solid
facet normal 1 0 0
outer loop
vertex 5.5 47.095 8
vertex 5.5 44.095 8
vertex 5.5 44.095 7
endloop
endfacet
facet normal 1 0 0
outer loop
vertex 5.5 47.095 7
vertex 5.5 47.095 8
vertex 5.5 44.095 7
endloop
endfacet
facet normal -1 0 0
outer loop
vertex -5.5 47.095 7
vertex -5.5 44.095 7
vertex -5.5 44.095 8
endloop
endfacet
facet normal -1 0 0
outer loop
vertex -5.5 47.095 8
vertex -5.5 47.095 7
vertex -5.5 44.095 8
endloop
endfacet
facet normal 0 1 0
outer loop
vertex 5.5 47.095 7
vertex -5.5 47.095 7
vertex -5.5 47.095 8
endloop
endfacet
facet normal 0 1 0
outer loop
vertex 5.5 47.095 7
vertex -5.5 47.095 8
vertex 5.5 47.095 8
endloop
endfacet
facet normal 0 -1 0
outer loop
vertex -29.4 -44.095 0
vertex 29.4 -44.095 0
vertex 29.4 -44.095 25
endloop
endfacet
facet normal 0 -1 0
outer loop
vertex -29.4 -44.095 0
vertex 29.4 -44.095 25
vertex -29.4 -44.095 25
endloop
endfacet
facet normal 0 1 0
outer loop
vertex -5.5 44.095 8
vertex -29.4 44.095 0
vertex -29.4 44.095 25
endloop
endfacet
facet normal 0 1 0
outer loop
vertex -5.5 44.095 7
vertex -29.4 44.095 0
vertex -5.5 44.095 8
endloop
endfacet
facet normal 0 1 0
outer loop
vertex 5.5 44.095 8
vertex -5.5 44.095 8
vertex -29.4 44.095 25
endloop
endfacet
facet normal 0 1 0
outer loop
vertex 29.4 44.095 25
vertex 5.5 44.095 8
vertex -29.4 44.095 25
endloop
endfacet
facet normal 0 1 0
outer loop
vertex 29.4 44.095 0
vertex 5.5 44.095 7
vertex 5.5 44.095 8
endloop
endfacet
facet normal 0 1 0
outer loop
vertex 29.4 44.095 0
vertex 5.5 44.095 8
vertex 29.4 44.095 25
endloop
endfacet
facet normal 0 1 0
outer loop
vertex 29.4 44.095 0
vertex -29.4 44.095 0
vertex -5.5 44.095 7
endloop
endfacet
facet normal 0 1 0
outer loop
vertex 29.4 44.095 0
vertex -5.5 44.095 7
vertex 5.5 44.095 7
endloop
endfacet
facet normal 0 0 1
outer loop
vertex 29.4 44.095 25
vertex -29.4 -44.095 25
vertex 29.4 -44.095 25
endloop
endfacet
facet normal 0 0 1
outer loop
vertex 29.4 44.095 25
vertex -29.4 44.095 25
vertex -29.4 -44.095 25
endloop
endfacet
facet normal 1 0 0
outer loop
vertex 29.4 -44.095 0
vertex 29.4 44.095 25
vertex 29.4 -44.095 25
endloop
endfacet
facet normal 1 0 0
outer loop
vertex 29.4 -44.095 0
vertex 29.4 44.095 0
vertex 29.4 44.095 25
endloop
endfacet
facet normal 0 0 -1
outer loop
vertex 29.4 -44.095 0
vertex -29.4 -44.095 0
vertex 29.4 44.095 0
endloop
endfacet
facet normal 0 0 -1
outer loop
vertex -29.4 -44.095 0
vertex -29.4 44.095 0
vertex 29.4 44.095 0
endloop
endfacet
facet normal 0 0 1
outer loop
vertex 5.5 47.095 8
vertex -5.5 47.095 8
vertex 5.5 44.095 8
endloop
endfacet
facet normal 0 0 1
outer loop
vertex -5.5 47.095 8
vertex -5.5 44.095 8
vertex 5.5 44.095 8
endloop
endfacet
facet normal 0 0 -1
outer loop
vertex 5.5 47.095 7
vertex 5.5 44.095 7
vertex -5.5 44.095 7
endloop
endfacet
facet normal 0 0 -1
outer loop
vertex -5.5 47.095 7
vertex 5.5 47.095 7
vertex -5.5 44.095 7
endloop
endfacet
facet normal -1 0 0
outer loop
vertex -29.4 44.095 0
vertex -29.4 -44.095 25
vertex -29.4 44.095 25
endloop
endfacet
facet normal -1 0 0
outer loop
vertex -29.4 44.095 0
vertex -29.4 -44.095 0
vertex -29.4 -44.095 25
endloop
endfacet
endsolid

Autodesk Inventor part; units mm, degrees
ref_plane "YZ Plane" through (0, 0, 0) normal (1, 0, 0) x (0, 1, 0)
ref_plane "XZ Plane" through (0, 0, 0) normal (0, 1, 0) x (-1, 0, 0)
ref_plane "XY Plane" through (0, 0, 0) normal (0, 0, 1) x (1, 0, 0)
sketch "Sketch2" plane through (0, 0, 0) normal (0, 0, 1) x (1, 0, 0)
  line L0 (-29.4, 44.095) -> (29.4, 44.095)
  line L1 (29.4, 44.095) -> (29.4, -44.095)
  line L2 (29.4, -44.095) -> (-29.4, -44.095)
  line L3 (-29.4, -44.095) -> (-29.4, 44.095)
  point P0 (0, 0)
  point P1 (29.4, 0)
  point P2 (0, 44.095)
  dimension "d0" = 58.8
  dimension "d1" = 88.19
extrude "Extrusion1" add sketch "Sketch2" along normal blind 25
sketch "Sketch3" plane through (-29.4, 44.095, 0) normal (0, 1, 0) x (1, 0, 0)
  line L0 (23.9, -8) -> (34.9, -8)
  line L1 (34.9, -8) -> (34.9, -7)
  line L2 (34.9, -7) -> (23.9, -7)
  line L3 (23.9, -7) -> (23.9, -8)
  line L4 (58.8, 0) -> (0, 0) projected
  point P0 (29.4, 0)
  point P1 (29.4, 0)
  point P2 (29.4, -7)
  dimension "d4" = 11
  dimension "d5" = 1
  dimension "d6" = 7
extrude "Extrusion2" add sketch "Sketch3" along normal blind 3
properties part number "rasberry"
